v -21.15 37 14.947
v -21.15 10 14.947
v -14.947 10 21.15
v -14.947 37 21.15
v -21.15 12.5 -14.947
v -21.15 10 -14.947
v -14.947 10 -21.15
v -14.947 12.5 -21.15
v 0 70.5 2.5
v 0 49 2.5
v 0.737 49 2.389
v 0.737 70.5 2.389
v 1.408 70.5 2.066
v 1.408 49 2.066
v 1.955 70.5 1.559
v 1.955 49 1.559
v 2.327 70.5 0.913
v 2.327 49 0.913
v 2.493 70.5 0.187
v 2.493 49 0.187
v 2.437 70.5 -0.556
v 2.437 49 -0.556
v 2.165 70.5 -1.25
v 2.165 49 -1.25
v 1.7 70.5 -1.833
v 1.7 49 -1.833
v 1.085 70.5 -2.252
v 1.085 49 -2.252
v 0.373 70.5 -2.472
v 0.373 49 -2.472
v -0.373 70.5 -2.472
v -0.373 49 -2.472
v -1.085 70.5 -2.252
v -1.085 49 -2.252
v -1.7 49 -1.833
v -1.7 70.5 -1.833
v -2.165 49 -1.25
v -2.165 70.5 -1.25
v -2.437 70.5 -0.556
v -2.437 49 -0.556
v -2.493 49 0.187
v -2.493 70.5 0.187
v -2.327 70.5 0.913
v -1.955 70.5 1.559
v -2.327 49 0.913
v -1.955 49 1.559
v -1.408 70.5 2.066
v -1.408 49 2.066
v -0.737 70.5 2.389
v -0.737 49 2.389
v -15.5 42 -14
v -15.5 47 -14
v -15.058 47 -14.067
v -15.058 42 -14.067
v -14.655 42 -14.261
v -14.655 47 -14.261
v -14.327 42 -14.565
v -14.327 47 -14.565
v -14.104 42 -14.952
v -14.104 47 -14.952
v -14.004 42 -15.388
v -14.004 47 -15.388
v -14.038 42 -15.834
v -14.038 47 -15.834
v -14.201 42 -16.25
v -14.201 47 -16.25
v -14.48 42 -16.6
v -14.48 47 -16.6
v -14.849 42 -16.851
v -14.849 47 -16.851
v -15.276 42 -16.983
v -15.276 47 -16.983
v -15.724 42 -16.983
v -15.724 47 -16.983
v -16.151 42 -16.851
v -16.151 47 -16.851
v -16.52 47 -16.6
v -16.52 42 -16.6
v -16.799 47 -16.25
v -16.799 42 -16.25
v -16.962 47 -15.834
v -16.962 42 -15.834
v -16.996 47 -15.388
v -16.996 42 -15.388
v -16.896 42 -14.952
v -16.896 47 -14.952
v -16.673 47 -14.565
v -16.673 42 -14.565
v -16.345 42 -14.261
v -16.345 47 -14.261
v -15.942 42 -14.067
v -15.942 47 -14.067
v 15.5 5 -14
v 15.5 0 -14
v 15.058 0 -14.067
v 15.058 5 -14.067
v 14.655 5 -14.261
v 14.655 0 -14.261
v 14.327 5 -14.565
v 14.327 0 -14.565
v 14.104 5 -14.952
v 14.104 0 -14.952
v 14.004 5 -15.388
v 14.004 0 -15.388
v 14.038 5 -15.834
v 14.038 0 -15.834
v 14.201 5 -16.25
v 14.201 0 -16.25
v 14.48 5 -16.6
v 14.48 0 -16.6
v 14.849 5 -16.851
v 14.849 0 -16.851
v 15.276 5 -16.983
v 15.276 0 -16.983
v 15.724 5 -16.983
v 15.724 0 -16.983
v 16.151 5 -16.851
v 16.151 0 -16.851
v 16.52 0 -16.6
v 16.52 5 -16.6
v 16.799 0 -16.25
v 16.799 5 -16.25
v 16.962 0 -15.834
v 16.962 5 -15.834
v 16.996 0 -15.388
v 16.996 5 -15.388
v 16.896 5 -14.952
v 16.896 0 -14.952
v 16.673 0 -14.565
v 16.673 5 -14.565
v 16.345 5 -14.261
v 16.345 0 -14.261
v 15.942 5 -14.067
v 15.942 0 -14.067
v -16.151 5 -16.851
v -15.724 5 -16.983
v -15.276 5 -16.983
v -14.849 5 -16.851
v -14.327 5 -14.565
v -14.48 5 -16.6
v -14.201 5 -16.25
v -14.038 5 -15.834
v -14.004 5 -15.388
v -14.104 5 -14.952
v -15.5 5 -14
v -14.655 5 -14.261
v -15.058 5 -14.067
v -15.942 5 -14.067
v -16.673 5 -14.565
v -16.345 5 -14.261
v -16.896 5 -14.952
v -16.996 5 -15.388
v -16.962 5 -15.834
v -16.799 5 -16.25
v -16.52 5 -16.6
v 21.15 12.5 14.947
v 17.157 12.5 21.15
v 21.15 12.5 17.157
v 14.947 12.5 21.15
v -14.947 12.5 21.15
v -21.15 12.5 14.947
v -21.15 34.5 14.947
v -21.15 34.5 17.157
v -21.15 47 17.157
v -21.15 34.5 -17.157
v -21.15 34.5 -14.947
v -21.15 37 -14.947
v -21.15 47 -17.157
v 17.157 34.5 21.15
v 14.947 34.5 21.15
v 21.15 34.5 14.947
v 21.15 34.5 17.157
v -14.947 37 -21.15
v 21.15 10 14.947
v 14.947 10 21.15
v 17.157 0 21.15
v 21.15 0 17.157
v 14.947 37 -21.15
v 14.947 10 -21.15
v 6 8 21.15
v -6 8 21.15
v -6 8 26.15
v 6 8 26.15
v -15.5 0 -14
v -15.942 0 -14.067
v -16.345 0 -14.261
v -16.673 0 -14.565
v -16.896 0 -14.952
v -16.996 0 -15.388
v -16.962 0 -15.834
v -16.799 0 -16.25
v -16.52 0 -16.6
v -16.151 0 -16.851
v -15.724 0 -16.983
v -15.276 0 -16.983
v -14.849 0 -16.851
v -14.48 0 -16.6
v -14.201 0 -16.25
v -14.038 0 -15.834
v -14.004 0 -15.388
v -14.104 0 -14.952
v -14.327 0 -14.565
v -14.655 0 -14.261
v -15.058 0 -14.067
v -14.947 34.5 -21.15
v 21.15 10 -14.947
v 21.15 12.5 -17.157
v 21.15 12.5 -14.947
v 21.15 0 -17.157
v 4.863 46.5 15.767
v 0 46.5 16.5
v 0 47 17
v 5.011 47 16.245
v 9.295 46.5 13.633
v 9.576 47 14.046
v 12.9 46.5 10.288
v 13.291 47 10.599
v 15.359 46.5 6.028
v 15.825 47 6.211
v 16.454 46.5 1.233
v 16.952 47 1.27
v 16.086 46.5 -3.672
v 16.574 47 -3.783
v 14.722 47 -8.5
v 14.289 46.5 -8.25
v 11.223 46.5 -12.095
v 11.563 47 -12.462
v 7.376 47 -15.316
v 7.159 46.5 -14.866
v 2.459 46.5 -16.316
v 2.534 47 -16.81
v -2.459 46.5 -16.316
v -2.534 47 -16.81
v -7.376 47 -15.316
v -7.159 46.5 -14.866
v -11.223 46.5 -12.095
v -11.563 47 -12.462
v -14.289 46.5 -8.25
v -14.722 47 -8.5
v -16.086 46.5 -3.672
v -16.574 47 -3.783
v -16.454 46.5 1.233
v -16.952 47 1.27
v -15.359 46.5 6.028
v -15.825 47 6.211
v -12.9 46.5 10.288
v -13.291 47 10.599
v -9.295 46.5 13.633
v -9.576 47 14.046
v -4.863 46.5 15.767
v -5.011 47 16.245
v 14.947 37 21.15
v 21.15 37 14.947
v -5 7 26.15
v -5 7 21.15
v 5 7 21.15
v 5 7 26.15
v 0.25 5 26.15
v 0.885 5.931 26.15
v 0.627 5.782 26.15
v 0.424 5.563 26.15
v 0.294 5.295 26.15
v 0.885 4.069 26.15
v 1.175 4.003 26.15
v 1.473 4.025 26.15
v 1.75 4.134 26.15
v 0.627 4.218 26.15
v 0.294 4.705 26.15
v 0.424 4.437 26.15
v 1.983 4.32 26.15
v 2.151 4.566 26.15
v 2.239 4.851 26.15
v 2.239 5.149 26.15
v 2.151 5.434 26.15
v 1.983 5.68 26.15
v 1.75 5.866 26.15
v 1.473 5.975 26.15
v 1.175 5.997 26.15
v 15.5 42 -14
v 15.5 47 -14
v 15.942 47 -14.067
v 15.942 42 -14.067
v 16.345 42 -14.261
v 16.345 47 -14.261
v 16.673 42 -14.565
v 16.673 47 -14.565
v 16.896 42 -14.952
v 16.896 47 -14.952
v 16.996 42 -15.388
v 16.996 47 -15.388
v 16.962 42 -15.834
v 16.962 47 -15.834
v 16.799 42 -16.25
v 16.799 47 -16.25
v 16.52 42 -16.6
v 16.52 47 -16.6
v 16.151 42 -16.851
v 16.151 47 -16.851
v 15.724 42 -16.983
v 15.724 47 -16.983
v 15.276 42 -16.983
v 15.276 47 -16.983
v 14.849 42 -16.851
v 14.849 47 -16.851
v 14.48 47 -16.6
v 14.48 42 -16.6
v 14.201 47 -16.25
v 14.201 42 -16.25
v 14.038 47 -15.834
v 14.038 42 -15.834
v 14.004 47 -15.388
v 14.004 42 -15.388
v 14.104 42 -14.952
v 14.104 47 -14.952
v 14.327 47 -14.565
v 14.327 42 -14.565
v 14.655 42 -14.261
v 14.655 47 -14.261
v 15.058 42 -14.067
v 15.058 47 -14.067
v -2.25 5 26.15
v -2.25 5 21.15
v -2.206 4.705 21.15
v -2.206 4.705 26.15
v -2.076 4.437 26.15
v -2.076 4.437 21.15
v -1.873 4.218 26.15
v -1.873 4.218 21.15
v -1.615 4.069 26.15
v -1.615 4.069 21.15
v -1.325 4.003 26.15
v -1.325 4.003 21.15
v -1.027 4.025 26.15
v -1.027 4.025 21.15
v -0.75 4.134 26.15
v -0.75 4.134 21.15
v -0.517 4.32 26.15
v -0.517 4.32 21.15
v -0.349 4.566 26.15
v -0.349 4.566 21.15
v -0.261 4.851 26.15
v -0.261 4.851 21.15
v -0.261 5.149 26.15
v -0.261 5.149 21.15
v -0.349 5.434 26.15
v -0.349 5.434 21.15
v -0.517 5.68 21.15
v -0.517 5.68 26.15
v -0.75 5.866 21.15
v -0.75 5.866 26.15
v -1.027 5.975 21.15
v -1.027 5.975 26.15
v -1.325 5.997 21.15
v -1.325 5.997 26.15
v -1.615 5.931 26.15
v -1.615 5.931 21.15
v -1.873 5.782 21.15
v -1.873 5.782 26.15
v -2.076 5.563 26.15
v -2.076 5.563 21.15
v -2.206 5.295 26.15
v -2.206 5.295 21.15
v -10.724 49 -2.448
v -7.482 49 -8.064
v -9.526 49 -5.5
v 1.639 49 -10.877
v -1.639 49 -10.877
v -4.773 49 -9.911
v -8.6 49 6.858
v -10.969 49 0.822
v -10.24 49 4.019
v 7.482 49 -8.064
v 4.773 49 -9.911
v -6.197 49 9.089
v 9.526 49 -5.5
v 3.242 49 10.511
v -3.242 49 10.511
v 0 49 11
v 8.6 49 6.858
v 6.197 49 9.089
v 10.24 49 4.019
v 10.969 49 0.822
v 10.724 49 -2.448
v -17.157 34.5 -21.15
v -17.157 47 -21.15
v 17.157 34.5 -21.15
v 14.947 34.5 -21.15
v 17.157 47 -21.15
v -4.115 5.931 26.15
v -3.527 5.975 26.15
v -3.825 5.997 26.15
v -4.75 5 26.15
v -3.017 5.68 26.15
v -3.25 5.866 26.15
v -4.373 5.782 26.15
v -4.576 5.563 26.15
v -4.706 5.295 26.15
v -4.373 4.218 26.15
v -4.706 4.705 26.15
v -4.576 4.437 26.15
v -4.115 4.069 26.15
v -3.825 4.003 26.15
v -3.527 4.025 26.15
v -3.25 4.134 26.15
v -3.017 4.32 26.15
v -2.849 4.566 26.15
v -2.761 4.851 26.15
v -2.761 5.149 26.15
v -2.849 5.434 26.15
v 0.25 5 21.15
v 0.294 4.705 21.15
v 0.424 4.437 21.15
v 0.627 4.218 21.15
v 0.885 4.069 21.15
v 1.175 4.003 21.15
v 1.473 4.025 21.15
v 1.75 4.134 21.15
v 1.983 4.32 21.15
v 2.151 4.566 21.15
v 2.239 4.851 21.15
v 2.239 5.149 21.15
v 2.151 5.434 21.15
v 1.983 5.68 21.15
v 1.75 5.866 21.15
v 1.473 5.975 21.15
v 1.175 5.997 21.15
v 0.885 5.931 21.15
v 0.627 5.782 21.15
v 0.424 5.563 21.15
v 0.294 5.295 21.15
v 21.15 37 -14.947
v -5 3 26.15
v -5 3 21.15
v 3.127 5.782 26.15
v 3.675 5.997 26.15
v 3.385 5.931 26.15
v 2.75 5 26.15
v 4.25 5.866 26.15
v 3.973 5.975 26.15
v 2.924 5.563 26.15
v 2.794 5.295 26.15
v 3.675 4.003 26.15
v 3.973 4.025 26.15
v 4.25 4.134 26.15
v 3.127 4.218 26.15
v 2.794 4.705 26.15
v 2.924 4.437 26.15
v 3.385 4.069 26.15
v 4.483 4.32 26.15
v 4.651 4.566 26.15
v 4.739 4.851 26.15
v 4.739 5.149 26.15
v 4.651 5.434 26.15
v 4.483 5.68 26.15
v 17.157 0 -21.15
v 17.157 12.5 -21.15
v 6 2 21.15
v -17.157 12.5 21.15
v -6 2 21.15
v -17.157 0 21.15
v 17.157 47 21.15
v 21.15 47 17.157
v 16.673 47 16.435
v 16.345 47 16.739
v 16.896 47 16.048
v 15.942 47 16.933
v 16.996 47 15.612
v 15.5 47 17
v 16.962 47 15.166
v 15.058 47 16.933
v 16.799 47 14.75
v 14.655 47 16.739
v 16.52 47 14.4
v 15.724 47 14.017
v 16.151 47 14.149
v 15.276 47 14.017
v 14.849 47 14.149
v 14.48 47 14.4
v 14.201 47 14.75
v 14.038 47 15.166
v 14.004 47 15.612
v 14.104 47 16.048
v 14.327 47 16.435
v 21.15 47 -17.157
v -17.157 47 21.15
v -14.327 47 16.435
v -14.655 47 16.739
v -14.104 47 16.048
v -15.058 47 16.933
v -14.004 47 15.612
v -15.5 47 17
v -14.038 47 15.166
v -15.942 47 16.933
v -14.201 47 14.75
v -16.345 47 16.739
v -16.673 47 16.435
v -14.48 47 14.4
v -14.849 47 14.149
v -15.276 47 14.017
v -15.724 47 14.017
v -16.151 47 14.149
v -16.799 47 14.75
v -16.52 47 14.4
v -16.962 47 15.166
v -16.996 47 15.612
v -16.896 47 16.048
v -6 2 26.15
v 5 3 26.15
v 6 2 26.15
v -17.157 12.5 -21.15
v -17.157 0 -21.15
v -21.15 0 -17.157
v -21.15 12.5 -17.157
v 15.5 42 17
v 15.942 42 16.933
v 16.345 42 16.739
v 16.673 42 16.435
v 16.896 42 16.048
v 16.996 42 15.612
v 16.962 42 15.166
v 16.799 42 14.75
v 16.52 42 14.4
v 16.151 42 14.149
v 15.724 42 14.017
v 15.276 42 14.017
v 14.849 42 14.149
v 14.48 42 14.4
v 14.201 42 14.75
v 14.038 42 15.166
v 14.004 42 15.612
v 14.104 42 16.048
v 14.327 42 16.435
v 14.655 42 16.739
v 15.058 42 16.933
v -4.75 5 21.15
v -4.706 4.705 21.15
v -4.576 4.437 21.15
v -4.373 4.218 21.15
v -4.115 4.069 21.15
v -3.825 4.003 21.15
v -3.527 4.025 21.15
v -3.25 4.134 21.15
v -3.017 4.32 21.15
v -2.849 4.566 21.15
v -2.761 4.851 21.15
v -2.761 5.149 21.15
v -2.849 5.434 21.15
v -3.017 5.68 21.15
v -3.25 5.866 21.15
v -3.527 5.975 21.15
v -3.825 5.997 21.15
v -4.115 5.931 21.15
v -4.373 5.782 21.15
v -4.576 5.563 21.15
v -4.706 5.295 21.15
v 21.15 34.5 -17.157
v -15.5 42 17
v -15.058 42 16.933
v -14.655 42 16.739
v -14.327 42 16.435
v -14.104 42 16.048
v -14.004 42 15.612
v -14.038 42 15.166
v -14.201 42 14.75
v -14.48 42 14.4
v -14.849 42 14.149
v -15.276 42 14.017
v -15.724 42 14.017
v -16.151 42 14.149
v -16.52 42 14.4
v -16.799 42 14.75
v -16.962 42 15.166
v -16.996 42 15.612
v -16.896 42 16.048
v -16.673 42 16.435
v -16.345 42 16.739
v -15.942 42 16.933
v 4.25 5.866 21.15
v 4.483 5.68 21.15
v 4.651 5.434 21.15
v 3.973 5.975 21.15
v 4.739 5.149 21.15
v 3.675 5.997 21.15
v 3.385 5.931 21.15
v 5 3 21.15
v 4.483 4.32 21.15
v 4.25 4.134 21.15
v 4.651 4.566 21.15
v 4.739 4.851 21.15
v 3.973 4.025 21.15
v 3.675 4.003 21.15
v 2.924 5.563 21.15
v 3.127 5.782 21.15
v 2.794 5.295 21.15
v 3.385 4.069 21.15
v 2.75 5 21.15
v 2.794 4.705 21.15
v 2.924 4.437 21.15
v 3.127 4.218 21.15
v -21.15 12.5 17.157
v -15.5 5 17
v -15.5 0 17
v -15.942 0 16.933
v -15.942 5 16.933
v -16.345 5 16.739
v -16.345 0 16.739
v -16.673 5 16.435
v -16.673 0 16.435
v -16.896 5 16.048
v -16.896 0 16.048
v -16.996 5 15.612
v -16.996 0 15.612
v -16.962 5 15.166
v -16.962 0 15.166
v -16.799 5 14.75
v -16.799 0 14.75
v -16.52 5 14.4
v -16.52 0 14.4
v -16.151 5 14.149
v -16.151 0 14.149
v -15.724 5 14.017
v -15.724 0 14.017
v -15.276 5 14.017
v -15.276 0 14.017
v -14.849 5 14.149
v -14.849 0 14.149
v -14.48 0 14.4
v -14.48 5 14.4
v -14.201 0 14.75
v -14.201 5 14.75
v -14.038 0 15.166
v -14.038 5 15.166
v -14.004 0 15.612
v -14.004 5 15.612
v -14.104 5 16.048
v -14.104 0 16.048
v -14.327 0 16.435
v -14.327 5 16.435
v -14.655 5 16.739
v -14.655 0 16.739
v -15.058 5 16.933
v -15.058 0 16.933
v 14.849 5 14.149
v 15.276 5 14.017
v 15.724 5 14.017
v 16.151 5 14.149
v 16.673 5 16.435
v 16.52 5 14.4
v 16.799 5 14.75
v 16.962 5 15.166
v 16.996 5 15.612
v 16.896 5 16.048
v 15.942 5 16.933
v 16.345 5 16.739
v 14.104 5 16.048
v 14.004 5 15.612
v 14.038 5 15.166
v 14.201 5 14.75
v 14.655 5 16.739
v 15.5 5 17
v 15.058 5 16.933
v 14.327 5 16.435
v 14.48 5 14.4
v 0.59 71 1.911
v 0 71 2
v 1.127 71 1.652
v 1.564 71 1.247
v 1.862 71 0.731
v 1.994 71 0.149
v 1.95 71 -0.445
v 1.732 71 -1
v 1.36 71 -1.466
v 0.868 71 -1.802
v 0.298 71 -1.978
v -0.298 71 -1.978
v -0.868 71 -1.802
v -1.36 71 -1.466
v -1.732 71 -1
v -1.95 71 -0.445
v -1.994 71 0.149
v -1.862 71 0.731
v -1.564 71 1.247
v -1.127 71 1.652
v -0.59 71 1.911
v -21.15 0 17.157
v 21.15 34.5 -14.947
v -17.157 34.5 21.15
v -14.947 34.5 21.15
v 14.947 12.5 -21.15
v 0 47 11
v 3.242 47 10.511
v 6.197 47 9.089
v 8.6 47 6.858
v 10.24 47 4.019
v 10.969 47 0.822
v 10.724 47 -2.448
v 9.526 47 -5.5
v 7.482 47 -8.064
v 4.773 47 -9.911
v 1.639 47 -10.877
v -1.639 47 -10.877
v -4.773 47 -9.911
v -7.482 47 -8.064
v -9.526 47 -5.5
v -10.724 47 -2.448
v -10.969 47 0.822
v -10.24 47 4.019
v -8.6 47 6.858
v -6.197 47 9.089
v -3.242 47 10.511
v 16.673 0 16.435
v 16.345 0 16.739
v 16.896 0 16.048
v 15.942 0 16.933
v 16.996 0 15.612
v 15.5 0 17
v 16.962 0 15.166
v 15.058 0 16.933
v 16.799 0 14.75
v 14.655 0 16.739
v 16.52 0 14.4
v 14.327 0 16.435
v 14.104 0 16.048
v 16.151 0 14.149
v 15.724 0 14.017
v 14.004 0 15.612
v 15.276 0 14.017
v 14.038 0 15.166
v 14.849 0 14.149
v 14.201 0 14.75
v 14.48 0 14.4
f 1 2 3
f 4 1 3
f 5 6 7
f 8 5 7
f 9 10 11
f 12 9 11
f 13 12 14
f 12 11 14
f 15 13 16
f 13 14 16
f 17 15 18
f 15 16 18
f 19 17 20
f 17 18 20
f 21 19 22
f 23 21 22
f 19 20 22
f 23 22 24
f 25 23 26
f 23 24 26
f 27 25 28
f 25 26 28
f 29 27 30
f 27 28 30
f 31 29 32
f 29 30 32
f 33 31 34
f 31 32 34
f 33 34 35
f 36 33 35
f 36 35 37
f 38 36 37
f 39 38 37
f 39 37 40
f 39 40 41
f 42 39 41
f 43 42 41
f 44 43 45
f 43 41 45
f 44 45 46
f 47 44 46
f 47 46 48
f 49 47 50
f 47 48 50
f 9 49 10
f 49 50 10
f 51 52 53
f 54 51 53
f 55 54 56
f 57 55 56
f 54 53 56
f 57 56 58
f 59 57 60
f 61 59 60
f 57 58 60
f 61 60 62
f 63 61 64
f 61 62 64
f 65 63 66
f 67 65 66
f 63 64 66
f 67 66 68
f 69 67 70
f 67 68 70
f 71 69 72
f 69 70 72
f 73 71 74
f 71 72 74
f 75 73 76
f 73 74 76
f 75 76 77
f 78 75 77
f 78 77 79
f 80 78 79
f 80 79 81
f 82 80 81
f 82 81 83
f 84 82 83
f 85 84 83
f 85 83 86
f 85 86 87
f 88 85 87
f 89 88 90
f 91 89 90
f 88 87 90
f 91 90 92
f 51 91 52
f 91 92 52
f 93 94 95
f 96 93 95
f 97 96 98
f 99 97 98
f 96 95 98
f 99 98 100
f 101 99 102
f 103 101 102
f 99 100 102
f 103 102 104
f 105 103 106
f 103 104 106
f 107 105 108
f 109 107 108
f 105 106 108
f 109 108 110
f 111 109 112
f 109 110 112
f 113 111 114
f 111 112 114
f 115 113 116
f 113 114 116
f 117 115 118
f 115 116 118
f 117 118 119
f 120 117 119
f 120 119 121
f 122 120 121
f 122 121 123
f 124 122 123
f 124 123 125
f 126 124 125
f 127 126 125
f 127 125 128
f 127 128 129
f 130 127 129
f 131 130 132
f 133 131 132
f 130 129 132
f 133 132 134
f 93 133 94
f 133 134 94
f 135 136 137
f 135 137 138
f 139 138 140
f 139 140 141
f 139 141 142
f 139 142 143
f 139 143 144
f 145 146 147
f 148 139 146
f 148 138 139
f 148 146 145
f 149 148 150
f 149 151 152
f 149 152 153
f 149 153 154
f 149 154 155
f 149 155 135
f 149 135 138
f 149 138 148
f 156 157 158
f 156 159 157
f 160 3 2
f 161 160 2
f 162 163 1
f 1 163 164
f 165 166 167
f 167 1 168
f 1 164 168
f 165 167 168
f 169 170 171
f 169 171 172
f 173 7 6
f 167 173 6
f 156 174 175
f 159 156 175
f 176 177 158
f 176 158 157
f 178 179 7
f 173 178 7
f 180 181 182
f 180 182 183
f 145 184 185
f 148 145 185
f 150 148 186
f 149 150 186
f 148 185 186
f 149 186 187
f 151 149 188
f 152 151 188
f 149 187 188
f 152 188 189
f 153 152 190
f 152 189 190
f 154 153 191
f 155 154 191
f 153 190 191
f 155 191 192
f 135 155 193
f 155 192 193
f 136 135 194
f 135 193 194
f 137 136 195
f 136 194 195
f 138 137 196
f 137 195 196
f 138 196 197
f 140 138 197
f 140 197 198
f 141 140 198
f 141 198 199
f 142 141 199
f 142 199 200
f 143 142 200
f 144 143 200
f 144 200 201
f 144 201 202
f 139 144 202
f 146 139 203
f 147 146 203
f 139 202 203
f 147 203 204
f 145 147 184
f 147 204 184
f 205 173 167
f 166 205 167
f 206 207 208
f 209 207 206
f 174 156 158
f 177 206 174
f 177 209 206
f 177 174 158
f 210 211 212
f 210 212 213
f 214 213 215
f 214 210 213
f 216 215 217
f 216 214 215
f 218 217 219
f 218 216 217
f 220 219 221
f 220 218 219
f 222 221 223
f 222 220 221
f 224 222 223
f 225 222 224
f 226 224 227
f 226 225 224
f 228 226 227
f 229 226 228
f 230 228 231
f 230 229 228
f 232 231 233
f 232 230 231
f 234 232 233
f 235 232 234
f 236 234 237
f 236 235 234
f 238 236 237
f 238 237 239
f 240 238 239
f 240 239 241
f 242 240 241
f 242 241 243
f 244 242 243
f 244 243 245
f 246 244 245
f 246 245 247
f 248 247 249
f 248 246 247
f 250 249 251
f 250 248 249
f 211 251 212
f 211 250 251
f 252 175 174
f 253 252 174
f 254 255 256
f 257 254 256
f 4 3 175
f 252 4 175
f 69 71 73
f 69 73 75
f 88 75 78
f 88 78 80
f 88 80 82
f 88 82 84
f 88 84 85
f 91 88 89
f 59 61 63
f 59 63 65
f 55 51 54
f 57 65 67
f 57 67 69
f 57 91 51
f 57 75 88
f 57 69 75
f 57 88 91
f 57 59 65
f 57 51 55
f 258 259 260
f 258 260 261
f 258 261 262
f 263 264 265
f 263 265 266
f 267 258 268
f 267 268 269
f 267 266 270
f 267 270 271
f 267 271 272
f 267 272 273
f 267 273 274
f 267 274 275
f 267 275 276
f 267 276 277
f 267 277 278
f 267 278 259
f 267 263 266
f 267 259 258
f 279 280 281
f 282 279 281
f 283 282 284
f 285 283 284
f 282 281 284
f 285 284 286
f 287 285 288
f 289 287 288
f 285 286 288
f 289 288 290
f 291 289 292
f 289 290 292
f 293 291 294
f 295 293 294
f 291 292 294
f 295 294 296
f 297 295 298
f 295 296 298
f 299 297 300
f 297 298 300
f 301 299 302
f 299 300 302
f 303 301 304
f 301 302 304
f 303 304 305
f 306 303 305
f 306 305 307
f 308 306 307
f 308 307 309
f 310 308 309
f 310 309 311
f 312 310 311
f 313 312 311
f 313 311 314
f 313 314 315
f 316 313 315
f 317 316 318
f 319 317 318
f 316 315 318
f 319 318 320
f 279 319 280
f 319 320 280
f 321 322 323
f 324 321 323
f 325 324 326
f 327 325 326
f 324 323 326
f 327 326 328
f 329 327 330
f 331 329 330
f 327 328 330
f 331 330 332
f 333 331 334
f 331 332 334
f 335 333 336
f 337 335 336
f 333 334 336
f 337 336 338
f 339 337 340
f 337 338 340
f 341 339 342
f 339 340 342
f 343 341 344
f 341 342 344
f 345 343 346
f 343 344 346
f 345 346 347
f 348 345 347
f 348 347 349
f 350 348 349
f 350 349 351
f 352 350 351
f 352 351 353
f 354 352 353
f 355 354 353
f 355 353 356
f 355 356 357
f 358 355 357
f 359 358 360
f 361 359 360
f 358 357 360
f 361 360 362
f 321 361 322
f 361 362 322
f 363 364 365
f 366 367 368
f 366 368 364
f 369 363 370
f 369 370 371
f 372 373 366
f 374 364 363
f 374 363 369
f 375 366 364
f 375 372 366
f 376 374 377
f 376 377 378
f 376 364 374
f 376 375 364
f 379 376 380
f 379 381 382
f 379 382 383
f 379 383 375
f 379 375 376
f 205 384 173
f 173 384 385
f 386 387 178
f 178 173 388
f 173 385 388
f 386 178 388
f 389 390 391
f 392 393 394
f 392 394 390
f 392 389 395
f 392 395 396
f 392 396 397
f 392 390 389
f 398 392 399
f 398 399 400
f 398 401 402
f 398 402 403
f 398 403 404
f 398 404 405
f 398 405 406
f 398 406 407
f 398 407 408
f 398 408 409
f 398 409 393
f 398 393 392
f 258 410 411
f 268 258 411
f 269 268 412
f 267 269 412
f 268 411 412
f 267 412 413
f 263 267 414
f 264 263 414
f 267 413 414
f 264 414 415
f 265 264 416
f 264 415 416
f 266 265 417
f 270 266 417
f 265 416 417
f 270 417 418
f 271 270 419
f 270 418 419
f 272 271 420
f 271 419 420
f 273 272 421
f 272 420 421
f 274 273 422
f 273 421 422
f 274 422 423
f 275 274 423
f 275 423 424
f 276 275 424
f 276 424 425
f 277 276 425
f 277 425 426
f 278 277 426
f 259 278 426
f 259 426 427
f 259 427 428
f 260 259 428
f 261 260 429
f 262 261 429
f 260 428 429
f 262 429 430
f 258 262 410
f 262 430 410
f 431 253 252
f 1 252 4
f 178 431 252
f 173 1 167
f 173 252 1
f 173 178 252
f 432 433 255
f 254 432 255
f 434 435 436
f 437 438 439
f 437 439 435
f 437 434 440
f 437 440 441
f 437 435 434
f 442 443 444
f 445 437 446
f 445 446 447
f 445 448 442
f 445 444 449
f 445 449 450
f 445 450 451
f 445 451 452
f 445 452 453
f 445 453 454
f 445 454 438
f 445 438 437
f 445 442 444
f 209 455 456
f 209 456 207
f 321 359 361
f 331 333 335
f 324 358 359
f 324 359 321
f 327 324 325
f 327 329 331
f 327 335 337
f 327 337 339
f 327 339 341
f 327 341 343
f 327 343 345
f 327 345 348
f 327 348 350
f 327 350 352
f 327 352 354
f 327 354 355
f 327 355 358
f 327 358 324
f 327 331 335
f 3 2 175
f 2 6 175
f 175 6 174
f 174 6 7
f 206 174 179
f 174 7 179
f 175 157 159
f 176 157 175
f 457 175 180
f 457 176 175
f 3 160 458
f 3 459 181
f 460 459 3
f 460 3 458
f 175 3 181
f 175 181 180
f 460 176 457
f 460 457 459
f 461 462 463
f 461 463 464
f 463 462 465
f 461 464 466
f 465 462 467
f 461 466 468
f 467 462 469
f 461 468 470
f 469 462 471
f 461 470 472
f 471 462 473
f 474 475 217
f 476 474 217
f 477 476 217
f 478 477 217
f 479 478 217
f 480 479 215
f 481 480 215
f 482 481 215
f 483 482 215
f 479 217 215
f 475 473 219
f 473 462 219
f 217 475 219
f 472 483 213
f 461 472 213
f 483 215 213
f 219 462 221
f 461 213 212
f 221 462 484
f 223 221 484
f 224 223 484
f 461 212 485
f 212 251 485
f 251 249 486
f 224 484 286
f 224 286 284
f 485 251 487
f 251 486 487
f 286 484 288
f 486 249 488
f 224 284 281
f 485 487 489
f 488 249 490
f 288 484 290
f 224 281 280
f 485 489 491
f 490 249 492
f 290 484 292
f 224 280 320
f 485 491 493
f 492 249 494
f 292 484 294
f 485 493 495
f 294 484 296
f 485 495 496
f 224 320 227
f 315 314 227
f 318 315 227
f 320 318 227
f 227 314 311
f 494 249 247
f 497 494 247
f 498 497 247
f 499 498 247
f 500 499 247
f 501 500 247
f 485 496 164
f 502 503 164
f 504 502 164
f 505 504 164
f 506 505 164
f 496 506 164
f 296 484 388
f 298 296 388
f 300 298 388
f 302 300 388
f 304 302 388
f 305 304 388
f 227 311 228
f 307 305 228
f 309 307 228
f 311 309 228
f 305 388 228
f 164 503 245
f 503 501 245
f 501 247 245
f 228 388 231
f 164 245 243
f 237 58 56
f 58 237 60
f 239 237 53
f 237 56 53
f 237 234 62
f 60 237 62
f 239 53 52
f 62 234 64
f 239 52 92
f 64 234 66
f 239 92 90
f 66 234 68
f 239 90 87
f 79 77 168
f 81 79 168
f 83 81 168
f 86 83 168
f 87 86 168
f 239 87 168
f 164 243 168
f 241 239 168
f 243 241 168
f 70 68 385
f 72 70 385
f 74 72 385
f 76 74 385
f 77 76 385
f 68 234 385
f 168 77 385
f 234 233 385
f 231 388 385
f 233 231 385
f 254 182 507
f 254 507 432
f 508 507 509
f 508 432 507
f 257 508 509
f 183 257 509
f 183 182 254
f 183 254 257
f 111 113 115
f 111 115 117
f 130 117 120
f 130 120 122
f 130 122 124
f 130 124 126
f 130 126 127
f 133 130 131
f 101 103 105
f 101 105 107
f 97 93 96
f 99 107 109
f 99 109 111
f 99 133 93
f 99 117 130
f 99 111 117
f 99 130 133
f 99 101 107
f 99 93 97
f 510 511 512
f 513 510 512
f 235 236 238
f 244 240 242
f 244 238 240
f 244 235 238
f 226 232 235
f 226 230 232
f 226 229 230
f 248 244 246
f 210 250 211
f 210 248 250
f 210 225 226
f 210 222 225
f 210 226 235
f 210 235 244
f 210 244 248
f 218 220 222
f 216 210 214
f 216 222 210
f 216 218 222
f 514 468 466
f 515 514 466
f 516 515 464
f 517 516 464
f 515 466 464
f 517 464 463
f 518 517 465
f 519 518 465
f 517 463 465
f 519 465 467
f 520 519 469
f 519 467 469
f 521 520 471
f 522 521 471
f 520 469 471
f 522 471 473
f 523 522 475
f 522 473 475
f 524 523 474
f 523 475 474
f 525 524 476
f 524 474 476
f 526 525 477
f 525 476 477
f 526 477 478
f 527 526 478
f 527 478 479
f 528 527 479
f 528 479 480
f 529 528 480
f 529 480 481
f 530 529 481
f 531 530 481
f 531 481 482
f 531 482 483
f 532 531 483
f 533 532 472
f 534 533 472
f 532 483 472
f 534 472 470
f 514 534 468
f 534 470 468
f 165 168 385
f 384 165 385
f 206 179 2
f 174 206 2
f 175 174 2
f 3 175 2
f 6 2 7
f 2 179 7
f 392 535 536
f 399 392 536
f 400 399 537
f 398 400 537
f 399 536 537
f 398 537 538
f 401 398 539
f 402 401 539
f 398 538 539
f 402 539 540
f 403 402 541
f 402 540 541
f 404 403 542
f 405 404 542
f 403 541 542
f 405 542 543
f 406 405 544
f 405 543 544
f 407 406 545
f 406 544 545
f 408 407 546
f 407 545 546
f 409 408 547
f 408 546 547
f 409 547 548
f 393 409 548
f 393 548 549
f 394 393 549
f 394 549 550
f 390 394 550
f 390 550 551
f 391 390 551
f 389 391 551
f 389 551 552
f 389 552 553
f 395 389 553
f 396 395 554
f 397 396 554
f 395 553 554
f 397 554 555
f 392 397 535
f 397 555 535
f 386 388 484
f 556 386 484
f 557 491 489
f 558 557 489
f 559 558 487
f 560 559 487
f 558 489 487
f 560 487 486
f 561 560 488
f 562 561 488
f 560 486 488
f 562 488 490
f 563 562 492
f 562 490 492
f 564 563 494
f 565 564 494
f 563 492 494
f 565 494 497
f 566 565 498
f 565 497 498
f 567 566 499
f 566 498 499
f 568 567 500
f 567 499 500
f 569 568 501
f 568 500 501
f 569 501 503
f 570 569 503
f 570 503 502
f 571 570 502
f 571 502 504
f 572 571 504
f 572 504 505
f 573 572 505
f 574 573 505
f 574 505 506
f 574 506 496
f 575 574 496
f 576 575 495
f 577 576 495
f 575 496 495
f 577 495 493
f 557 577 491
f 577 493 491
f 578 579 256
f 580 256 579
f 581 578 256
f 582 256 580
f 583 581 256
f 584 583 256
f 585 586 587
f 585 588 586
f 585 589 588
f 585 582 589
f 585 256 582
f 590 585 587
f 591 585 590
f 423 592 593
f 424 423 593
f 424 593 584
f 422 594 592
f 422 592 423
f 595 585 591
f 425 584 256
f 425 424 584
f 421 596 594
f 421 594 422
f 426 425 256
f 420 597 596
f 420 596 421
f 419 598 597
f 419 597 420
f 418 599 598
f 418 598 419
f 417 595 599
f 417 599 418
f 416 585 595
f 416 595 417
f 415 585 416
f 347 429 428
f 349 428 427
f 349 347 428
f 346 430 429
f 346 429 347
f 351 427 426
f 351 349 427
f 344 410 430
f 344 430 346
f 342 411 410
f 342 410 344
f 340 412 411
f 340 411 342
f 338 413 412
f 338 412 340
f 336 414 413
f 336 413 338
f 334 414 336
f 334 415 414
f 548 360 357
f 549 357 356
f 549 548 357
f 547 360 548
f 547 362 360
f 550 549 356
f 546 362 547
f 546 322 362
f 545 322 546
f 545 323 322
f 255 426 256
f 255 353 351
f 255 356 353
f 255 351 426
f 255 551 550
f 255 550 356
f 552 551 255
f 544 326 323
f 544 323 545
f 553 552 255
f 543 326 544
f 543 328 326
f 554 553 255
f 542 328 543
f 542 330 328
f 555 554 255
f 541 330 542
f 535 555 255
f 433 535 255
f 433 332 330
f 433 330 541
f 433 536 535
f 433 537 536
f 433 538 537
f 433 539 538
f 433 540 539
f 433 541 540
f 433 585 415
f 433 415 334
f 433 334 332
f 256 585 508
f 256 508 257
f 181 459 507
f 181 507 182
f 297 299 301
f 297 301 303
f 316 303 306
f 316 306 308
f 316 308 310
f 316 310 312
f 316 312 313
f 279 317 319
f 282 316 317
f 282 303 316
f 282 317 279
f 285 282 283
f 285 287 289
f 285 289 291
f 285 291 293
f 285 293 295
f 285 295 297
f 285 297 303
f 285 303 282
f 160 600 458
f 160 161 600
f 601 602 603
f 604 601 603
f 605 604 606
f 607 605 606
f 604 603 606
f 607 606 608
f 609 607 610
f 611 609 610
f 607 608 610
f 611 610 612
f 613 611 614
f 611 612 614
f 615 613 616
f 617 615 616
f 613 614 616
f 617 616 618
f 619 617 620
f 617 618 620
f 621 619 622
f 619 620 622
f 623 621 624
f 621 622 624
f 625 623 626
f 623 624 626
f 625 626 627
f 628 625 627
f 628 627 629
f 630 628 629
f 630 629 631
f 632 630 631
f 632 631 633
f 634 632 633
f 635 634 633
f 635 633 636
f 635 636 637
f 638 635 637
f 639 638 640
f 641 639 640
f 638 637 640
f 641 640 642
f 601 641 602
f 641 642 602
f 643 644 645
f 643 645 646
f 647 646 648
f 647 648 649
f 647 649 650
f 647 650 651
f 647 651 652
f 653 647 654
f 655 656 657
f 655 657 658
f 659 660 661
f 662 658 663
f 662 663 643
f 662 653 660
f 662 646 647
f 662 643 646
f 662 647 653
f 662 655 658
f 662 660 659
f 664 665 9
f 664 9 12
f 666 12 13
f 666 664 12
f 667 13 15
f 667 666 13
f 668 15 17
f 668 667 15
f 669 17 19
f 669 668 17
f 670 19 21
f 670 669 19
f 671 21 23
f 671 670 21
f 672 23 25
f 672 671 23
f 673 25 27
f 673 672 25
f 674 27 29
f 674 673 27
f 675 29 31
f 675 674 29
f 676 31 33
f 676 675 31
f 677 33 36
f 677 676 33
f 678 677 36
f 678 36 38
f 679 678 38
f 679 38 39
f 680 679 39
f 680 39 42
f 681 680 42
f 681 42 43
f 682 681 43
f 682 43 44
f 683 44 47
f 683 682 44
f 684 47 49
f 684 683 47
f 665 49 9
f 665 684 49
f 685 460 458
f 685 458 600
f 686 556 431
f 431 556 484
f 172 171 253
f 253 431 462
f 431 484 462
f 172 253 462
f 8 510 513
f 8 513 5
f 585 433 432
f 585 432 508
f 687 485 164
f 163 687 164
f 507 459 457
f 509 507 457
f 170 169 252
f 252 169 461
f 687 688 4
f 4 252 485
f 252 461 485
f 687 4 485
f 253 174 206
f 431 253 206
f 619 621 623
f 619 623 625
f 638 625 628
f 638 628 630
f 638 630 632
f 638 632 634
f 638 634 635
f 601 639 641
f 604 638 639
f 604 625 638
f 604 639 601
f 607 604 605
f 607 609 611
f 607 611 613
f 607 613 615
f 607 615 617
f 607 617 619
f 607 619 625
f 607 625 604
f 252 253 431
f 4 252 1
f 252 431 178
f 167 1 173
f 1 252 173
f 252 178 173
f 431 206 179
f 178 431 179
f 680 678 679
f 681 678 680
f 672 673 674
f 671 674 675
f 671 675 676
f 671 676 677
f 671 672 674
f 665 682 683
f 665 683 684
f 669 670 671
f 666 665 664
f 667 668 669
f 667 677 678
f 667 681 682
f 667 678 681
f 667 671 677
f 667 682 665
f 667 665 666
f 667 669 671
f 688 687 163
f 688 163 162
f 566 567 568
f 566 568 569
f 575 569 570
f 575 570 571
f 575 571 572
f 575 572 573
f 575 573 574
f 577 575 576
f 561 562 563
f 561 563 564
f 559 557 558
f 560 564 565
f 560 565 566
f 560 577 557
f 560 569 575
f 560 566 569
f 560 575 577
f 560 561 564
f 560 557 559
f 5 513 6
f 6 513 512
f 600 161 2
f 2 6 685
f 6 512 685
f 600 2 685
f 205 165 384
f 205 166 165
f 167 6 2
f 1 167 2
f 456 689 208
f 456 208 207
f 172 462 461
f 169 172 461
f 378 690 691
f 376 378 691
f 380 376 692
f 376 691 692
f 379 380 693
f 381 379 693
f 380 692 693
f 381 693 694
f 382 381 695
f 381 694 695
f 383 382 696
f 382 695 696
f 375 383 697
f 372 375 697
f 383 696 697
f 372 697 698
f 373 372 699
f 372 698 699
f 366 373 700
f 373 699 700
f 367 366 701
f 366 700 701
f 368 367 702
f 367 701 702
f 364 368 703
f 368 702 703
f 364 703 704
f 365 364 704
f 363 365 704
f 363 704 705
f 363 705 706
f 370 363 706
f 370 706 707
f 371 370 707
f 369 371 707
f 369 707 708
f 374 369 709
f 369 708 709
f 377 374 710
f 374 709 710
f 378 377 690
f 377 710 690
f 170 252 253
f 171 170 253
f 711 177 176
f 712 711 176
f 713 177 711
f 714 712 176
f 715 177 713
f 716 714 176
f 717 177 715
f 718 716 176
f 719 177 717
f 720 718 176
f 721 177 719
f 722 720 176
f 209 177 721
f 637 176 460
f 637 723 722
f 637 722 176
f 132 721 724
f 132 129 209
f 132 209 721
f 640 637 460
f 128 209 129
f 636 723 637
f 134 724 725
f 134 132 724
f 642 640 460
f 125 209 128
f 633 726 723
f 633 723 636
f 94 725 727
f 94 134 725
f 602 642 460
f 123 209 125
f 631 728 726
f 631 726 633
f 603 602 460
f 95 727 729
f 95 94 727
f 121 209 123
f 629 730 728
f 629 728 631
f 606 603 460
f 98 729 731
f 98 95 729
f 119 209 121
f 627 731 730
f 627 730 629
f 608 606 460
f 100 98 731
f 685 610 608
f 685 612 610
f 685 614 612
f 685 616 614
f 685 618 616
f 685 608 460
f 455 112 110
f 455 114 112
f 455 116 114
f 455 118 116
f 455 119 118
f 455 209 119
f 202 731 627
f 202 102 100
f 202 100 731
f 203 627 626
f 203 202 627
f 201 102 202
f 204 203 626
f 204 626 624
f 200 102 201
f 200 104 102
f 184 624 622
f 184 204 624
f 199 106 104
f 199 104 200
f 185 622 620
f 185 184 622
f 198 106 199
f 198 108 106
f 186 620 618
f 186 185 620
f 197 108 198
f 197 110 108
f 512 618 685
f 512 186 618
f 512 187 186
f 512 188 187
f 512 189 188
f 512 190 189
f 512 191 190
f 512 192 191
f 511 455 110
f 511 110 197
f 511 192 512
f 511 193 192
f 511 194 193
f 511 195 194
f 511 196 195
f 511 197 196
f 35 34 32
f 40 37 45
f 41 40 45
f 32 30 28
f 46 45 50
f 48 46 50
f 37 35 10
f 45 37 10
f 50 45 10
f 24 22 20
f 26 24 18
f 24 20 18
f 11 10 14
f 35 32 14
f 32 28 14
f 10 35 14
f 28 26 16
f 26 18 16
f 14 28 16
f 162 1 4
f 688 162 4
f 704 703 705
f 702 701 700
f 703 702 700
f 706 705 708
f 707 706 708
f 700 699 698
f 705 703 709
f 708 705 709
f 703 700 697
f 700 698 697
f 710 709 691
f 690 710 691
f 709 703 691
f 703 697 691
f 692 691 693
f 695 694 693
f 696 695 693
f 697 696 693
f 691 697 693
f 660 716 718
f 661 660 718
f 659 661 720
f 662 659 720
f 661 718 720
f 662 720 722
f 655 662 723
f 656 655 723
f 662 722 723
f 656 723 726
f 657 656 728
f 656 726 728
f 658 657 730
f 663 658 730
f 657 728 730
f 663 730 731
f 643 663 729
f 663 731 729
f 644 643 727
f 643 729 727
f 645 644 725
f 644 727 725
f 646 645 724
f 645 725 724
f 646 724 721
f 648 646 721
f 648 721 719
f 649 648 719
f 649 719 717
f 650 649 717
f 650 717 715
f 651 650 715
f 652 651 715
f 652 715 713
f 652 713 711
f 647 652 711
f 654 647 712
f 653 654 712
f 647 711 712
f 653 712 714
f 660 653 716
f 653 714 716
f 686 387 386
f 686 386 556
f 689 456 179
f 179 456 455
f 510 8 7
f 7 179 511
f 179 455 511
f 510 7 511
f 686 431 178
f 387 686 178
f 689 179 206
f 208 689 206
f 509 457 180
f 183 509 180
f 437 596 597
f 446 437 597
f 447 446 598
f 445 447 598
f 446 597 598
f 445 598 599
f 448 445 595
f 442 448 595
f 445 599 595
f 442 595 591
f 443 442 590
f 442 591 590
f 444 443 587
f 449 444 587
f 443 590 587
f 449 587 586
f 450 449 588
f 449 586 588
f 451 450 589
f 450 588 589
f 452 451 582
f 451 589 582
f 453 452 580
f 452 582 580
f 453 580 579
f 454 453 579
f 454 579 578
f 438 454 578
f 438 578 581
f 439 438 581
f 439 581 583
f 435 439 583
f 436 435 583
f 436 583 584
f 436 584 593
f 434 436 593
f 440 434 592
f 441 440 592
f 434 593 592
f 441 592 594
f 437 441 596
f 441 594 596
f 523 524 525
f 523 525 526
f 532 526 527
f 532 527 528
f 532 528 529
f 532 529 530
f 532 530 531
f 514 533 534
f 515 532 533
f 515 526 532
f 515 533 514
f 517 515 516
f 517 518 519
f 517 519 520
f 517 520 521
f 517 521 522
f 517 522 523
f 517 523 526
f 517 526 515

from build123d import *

# Parameters (mm, degrees)
BOSS_EXTRUDE1_DEPTH  = 10
BOSS_EXTRUDE2_DEPTH  = 2.5
BOSS_EXTRUDE6_DEPTH  = 10
BOSS_EXTRUDE7_DEPTH  = 2.5
BOSS_EXTRUDE8_REACH  = 49.578
SKETCH8_R            = 11
BOSS_EXTRUDE9_DEPTH  = 2
SKETCH9_R            = 2.5
BOSS_EXTRUDE10_DEPTH = 22
CHAMFER1_SIZE        = 0.5
SKETCH10_R           = 1.5
CUT_EXTRUDE1_DEPTH   = 5
SKETCH11_R           = 1.5
CUT_EXTRUDE2_DEPTH   = 5
SKETCH12_R           = 15
CUT_EXTRUDE3_DEPTH   = 0.5
CHAMFER2_SIZE        = 2
SKETCH13_W           = 12
SKETCH13_H           = 6
SKETCH13_W_2         = 10
SKETCH13_H_2         = 4
BOSS_EXTRUDE11_DEPTH = 5
SKETCH14_R           = 1
BOSS_EXTRUDE12_DEPTH = 5


with BuildPart() as part:
    # Sketch1 → Boss-Extrude1 (new body)
    with BuildSketch(Plane(origin=(0, 0, 0), x_dir=(1, 0, 0), z_dir=(0, 1, 0))):
        Polygon((-21.15, 17.157498476), (-17.157498476, 21.15), (17.157498476, 21.15), (21.15, 17.157498476), (21.15, -17.157498476), (17.157498476, -21.15), (-17.157498476, -21.15), (-21.15, -17.157498476), align=None)
    extrude(amount=BOSS_EXTRUDE1_DEPTH)

    # Sketch2 → Boss-Extrude2 (add)
    with BuildSketch(Plane(origin=(0, 10, 0), x_dir=(1, 0, 0), z_dir=(0, 1, 0))):
        Polygon((-17.157498476, 21.15), (-21.15, 17.157498476), (-21.15, 14.946774472), (-14.946774472, 21.15), align=None)
        Polygon((21.15, 17.157498476), (17.157498476, 21.15), (14.946774472, 21.15), (21.15, 14.946774472), align=None)
        Polygon((17.157498476, -21.15), (21.15, -17.157498476), (21.15, -14.946774472), (14.946774472, -21.15), align=None)
        Polygon((-21.15, -17.157498476), (-17.157498476, -21.15), (-14.946774472, -21.15), (-21.15, -14.946774472), align=None)
    extrude(amount=BOSS_EXTRUDE2_DEPTH)

    # Sketch11 → Cut-Extrude2 (cut)
    with BuildSketch(Plane.XZ):
        with Locations(Location((-15.5, 15.5, 0), (0, 0, 90))):
            Circle(SKETCH11_R)
        with Locations(Location((15.5, 15.5, 0), (0, 0, 90))):
            Circle(SKETCH11_R)
        with Locations(Location((15.5, -15.5, 0), (0, 0, 90))):
            Circle(SKETCH11_R)
        with Locations(Location((-15.5, -15.5, 0), (0, 0, 90))):
            Circle(SKETCH11_R)
    extrude(amount=-CUT_EXTRUDE2_DEPTH, mode=Mode.SUBTRACT)

    # Sketch13 → Boss-Extrude11 (add)
    with BuildSketch(Plane.XY.offset(21.15)):
        with Locations((0, 5)):
            Rectangle(SKETCH13_W, SKETCH13_H)
        with Locations((0, 5)):
            Rectangle(SKETCH13_W_2, SKETCH13_H_2, mode=Mode.SUBTRACT)
    extrude(amount=BOSS_EXTRUDE11_DEPTH)

    # Sketch14 → Boss-Extrude12 (add)
    with BuildSketch(Plane.XY.offset(21.15)):
        with Locations(Location((-3.75, 5, 0), (0, 0, 180))):
            Circle(SKETCH14_R)
        with Locations(Location((-1.25, 5, 0), (0, 0, 180))):
            Circle(SKETCH14_R)
        with Locations(Location((1.25, 5, 0), (0, 0, 180))):
            Circle(SKETCH14_R)
        with Locations(Location((3.75, 5, 0), (0, 0, 180))):
            Circle(SKETCH14_R)
    extrude(amount=BOSS_EXTRUDE12_DEPTH)


with BuildPart() as body_2:
    # Sketch6 → Boss-Extrude6 (new body)
    with BuildSketch(Plane(origin=(0, 47, 0), x_dir=(-1, 0, 0), z_dir=(0, -1, 0))):
        Polygon((-17.157498476, -21.15), (17.157498476, -21.15), (21.15, -17.157498476), (21.15, 17.157498476), (17.157498476, 21.15), (-17.157498476, 21.15), (-21.15, 17.157498476), (-21.15, -17.157498476), align=None)
    extrude(amount=BOSS_EXTRUDE6_DEPTH)

    # Sketch7 → Boss-Extrude7 (add)
    with BuildSketch(Plane.XZ.offset(-37)):
        Polygon((-21.15, -17.157498476), (-17.157498476, -21.15), (-14.946774472, -21.15), (-21.15, -14.946774472), align=None)
        Polygon((-17.157498476, 21.15), (-21.15, 17.157498476), (-21.15, 14.946774472), (-14.946774472, 21.15), align=None)
        Polygon((21.15, 17.157498476), (17.157498476, 21.15), (14.946774472, 21.15), (21.15, 14.946774472), align=None)
        Polygon((21.15, -14.946774472), (14.946774472, -21.15), (17.157498476, -21.15), (21.15, -17.157498476), align=None)
    extrude(amount=BOSS_EXTRUDE7_DEPTH)


with BuildPart() as body_3:

    # Sketch3 → Boss-Extrude8 (new, up to next)
    with BuildSketch(Plane(origin=(0, 10, 0), x_dir=(1, 0, 0), z_dir=(0, 1, 0)), mode=Mode.PRIVATE) as boss_extrude8_sk1:
        Polygon((-21.15, -14.946774472), (-14.946774472, -21.15), (14.946774472, -21.15), (21.15, -14.946774472), (21.15, 14.946774472), (14.946774472, 21.15), (-14.946774472, 21.15), (-21.15, 14.946774472), align=None)
    boss_extrude8_tool1 = extrude(boss_extrude8_sk1.sketch, amount=BOSS_EXTRUDE8_REACH, mode=Mode.PRIVATE) - body_2.part
    add(boss_extrude8_tool1.solids().sort_by_distance((0, 10, 0))[0])


with BuildPart() as body_4:
    # Sketch8 → Boss-Extrude9 (new body)
    with BuildSketch(Plane(origin=(0, 47, 0), x_dir=(1, 0, 0), z_dir=(0, 1, 0))):
        with Locations(Location((0, 0, 0), (0, 0, 270))):
            Circle(SKETCH8_R)
    extrude(amount=BOSS_EXTRUDE9_DEPTH)


with BuildPart() as body_5:
    # Sketch9 → Boss-Extrude10 (new body)
    with BuildSketch(Plane(origin=(0, 49, 0), x_dir=(1, 0, 0), z_dir=(0, 1, 0))):
        with Locations(Location((0, 0, 0), (0, 0, 270))):
            Circle(SKETCH9_R)
    extrude(amount=BOSS_EXTRUDE10_DEPTH)

    # Chamfer1
    chamfer1_edges = [body_5.edges().sort_by_distance(p)[0] for p in [
        (0, 71, -2.5),
    ]]
    chamfer(chamfer1_edges, length=CHAMFER1_SIZE)


with BuildPart() as body_2_1:
    add(body_2.part)

    # Sketch10 → Cut-Extrude1 (cut)
    with BuildSketch(Plane(origin=(0, 47, 0), x_dir=(1, 0, 0), z_dir=(0, 1, 0))):
        with Locations(Location((-15.5, 15.5, 0), (0, 0, 270))):
            Circle(SKETCH10_R)
        with Locations(Location((15.5, 15.5, 0), (0, 0, 270))):
            Circle(SKETCH10_R)
        with Locations(Location((15.5, -15.5, 0), (0, 0, 270))):
            Circle(SKETCH10_R)
        with Locations(Location((-15.5, -15.5, 0), (0, 0, 270))):
            Circle(SKETCH10_R)
    extrude(amount=-CUT_EXTRUDE1_DEPTH, mode=Mode.SUBTRACT)

    # Sketch12 → Cut-Extrude3 (cut)
    with BuildSketch(Plane(origin=(0, 47, 0), x_dir=(1, 0, 0), z_dir=(0, 1, 0))):
        with Locations(Location((0, 0, 0), (0, 0, 270))):
            Circle(SKETCH12_R)
    extrude(amount=-CUT_EXTRUDE3_DEPTH, mode=Mode.SUBTRACT)

    # Chamfer2
    # the kernel refuses this chamfer: 2 mm, written as the material it takes off along each edge
    with BuildSketch(Plane(origin=(0, 47, 0), x_dir=(0, 0, 1), z_dir=(-1, 0, 0))) as chamfer2_piece_1_section:
        Polygon((15 + CHAMFER2_SIZE, 0), (15, -CHAMFER2_SIZE), (15, 0), align=None)
    chamfer2_piece_1 = revolve(axis=Axis((0, 47, 0), (0, 1, 0)), mode=Mode.PRIVATE)
    chamfer2_piece_1 = split(chamfer2_piece_1, bisect_by=Plane(origin=(0, 46.5, -16.745546596), z_dir=(0, 1, 0)), keep=Keep.TOP, mode=Mode.PRIVATE)
    add(chamfer2_piece_1, mode=Mode.SUBTRACT)


solid = Compound([part.part, body_3.part, body_4.part, body_5.part, body_2_1.part])
